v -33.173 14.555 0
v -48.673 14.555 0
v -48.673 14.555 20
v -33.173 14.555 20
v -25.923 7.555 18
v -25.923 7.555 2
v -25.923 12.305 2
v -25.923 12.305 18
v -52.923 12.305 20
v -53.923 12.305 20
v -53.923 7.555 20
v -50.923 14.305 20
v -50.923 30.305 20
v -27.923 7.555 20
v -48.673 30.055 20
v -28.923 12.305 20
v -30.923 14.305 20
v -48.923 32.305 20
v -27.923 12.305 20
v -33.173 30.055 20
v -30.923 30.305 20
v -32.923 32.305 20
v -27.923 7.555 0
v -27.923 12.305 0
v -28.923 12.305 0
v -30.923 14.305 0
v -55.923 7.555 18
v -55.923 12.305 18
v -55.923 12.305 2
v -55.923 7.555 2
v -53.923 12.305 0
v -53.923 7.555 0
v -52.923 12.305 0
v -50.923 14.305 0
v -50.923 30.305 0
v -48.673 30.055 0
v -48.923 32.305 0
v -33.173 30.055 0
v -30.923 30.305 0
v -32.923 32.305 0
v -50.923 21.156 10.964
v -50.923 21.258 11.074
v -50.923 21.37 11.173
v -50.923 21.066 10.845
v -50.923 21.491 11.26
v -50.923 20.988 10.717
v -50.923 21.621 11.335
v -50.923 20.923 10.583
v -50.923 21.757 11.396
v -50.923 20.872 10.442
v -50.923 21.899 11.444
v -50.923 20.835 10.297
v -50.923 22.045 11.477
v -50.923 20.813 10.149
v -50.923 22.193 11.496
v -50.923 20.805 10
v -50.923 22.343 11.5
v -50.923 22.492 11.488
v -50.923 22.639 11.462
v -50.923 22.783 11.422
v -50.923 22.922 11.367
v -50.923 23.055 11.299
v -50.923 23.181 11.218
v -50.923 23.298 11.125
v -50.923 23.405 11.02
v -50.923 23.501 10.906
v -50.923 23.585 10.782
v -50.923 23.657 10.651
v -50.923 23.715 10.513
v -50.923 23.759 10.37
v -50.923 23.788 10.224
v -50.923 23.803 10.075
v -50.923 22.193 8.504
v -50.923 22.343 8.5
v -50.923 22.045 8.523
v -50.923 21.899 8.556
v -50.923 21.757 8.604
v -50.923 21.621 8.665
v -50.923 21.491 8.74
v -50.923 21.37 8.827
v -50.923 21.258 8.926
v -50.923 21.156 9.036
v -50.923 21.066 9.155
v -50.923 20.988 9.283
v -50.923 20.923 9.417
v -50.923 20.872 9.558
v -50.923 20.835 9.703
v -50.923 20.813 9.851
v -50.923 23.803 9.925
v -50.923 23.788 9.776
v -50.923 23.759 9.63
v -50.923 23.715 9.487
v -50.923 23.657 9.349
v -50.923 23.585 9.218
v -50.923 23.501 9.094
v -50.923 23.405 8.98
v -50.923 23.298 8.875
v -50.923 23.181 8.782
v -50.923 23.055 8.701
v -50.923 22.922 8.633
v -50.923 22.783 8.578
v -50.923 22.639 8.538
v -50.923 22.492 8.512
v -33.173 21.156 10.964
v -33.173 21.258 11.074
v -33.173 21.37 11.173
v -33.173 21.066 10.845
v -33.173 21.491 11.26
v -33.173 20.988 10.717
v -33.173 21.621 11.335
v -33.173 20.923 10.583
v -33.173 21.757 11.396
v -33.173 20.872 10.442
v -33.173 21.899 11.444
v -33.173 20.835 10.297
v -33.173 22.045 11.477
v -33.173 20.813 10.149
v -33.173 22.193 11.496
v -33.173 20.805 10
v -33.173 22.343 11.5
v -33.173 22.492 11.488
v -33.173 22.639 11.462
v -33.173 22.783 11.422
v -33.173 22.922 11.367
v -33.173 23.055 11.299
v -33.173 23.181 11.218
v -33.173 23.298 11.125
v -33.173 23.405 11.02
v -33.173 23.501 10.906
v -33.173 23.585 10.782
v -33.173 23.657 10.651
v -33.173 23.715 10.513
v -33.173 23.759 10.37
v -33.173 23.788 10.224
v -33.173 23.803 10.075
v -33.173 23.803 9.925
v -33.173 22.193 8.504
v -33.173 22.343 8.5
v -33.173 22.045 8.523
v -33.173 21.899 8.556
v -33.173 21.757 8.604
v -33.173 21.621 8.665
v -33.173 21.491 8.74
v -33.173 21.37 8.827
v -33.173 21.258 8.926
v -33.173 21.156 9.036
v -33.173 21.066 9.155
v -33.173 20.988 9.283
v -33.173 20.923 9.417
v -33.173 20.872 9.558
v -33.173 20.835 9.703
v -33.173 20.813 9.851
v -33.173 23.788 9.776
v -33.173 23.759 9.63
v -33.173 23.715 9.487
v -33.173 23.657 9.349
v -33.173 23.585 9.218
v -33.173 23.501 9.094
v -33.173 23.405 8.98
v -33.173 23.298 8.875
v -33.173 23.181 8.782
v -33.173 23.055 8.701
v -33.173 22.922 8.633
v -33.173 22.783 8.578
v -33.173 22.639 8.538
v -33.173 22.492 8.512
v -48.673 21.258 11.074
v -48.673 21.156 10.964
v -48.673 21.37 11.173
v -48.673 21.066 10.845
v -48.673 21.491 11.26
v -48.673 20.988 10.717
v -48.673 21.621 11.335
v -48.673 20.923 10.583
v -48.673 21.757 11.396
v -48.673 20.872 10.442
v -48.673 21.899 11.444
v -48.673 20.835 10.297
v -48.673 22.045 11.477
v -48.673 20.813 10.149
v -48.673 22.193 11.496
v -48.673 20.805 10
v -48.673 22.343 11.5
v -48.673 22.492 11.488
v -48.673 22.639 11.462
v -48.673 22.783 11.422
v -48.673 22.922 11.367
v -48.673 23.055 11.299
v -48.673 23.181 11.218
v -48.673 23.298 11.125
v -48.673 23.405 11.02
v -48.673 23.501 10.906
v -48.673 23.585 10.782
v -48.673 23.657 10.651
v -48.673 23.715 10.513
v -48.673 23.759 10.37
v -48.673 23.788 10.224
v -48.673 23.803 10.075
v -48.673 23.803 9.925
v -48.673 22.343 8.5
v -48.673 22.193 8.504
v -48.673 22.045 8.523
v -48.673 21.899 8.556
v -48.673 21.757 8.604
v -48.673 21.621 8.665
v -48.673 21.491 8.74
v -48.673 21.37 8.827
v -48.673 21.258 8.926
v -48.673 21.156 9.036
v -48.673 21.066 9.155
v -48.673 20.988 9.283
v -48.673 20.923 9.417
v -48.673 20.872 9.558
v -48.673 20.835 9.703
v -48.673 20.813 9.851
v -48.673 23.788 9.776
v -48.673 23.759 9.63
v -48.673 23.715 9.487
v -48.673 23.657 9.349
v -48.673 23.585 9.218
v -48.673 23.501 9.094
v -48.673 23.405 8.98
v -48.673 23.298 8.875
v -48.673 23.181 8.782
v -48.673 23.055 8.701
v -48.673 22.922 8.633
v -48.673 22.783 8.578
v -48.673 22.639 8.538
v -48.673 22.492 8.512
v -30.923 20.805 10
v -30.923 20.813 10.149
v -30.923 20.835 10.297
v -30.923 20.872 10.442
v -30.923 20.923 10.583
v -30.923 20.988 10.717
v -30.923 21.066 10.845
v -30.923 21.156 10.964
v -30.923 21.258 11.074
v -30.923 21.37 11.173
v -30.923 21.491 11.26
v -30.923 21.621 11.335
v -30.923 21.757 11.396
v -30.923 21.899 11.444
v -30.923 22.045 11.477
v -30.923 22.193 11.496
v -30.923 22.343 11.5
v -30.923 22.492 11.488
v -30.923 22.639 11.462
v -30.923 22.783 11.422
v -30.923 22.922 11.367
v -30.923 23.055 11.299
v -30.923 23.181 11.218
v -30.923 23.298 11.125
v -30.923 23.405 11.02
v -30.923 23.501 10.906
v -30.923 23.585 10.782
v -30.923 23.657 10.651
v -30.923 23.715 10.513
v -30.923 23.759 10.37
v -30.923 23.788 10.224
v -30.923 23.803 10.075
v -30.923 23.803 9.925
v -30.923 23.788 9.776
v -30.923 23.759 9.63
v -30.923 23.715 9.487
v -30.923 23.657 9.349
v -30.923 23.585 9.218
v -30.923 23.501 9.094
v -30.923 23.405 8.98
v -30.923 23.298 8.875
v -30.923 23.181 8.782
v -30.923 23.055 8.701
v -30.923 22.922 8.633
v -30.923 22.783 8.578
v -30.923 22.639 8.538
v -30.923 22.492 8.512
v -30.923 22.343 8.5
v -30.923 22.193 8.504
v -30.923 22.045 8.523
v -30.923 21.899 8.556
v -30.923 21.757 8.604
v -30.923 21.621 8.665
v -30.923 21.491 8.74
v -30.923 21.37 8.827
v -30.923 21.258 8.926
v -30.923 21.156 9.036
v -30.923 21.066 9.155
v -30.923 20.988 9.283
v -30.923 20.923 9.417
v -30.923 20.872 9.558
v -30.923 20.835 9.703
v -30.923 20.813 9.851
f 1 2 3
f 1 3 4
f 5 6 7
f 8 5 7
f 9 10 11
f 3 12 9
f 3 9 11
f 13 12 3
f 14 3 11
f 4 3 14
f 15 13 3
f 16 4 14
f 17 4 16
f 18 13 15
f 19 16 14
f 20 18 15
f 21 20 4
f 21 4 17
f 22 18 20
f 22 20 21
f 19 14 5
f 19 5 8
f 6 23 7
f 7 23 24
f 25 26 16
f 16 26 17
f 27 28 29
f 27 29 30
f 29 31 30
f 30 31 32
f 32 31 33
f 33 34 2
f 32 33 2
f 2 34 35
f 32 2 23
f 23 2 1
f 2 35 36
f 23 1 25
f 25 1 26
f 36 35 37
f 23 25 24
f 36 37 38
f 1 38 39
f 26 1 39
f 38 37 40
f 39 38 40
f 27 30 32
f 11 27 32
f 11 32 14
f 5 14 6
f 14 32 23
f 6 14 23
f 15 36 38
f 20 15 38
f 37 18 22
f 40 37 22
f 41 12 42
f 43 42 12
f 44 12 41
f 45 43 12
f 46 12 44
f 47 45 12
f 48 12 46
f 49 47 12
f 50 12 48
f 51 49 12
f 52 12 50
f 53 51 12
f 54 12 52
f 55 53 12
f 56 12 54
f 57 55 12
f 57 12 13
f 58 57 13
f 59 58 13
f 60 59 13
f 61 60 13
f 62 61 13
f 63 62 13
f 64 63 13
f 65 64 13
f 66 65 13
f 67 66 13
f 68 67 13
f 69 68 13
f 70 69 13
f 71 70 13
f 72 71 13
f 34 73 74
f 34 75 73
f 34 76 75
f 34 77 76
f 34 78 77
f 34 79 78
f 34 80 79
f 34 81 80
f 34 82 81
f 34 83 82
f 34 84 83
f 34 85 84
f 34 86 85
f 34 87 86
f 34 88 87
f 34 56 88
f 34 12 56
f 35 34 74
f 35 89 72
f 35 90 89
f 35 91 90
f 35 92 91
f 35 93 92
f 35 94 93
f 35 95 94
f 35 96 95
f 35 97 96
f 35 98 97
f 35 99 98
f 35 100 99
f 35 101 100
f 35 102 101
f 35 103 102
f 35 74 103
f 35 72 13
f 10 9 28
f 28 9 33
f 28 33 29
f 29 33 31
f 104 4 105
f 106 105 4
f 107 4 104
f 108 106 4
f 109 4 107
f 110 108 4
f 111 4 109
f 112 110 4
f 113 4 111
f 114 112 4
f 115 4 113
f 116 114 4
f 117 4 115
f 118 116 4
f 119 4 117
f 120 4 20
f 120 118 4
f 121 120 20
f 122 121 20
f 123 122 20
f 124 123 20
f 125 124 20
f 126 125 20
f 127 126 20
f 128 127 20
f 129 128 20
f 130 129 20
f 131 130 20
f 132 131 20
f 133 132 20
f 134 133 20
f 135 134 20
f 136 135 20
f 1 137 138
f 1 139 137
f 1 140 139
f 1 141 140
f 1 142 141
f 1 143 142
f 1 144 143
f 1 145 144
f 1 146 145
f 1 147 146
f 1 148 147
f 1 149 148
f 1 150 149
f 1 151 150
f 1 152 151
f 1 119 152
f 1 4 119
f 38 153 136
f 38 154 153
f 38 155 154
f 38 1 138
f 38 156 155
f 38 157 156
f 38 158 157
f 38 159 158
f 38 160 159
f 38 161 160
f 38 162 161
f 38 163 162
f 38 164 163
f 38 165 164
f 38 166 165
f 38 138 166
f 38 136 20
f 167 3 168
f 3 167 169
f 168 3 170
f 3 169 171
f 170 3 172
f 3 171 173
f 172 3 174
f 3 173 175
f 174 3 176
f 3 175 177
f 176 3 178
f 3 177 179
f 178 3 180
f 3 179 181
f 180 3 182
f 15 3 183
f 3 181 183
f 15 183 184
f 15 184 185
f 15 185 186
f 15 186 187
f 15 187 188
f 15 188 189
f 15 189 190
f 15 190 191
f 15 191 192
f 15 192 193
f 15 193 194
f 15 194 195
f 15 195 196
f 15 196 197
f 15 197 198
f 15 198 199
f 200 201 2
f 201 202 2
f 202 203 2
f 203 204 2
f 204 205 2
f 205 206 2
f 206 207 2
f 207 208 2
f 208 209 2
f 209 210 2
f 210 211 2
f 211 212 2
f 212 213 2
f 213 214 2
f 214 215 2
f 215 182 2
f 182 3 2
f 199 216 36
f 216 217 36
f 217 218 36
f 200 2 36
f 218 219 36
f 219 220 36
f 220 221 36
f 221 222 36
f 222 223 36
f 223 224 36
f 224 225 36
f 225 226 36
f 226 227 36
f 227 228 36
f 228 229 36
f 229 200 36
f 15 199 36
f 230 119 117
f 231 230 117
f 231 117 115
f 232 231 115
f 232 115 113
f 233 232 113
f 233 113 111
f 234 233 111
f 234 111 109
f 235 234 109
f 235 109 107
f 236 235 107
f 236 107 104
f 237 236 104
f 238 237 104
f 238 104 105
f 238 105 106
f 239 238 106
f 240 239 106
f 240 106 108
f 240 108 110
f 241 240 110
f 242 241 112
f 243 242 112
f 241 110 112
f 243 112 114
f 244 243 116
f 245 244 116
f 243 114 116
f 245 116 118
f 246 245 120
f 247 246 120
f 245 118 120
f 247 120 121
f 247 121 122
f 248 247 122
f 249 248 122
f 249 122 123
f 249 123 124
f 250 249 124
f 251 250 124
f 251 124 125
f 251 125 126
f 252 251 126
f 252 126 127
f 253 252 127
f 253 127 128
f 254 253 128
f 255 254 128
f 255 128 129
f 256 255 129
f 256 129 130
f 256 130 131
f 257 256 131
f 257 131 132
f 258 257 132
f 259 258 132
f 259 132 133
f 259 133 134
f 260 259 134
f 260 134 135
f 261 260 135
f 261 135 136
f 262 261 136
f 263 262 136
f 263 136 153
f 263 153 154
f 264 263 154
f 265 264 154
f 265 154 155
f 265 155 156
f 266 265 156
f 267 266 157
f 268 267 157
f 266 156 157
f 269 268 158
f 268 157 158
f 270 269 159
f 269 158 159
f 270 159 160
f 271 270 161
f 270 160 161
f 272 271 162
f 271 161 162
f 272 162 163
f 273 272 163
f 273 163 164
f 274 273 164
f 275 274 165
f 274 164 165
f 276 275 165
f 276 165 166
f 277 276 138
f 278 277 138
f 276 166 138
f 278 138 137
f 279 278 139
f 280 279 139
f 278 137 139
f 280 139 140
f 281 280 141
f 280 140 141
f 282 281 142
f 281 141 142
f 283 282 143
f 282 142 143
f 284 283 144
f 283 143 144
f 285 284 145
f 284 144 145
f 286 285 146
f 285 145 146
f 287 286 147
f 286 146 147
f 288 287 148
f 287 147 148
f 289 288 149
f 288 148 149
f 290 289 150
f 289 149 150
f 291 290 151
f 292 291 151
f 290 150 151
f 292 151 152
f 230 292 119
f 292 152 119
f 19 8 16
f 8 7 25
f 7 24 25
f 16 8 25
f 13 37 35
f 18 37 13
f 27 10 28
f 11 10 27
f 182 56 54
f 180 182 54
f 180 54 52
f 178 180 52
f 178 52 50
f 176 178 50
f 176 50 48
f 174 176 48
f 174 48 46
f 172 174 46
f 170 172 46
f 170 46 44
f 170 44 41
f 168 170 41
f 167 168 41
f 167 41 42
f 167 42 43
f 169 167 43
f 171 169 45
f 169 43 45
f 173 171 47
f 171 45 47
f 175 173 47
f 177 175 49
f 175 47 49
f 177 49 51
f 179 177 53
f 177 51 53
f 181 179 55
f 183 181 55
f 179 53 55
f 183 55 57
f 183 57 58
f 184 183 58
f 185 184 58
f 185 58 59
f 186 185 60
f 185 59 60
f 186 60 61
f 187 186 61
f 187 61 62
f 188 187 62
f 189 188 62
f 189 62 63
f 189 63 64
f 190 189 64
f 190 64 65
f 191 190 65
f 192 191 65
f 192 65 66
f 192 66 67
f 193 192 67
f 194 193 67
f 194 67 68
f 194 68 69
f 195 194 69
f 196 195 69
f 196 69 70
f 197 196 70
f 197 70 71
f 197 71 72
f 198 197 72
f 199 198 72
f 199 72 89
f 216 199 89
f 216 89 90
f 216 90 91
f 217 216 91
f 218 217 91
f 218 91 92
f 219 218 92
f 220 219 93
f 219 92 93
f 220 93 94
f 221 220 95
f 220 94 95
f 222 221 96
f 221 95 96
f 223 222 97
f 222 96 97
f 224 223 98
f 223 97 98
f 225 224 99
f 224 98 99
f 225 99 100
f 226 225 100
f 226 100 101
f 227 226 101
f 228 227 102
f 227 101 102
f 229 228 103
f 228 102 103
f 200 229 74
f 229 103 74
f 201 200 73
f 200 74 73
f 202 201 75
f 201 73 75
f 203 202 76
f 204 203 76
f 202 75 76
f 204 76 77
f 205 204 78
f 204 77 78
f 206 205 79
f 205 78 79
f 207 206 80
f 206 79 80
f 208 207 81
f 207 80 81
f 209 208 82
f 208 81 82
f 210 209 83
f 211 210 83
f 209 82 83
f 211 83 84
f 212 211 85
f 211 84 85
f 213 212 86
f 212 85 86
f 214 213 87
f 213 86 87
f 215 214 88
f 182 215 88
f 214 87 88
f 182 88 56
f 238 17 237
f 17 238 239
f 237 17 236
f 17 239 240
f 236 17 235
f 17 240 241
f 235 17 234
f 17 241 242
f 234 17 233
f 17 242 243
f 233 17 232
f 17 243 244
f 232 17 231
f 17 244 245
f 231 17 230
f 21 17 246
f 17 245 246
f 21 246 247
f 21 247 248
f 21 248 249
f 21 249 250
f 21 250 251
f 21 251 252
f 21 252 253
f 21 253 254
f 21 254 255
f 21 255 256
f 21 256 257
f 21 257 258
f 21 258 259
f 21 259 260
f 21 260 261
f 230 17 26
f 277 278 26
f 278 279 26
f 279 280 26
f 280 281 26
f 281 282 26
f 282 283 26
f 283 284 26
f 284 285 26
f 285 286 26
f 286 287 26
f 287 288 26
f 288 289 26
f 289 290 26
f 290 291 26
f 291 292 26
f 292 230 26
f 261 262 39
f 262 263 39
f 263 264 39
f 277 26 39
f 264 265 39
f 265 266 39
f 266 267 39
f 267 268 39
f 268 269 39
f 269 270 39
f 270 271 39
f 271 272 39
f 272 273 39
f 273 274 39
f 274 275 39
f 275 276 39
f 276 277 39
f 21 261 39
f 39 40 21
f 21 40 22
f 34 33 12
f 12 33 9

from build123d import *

# Parameters (mm, degrees)
F0_W     = 20
F0_H     = 20
F0_W_2   = 15.5
F0_H_2   = 15.5
F1_DEPTH = 20
F2_SIZE  = 2
F3_R     = 1.5
F4_DEPTH = 25


with BuildPart() as f1:
    # F0 (on Top) → F1 (new body)
    with BuildSketch(Plane.XY):
        with Locations((-40.922806, 22.305217)):
            Rectangle(F0_W, F0_H)
        with Locations((-40.922806, 22.305217)):
            Rectangle(F0_W_2, F0_H_2, mode=Mode.SUBTRACT)
        Polygon((-30.922806, 12.305217), (-50.922806, 12.305217), (-55.922806, 12.305217), (-55.922806, 7.555217), (-25.922806, 7.555217), (-25.922806, 12.305217), align=None)
    extrude(amount=F1_DEPTH)

    # F2
    f2_edges = [f1.edges().sort_by_distance(p)[0] for p in [
        (-50.922806, 32.305217, 10),
        (-30.922806, 32.305217, 10),
        (-25.922806, 9.930217, 20),
        (-55.922806, 9.930217, 20),
        (-55.922806, 9.930217, 0),
        (-25.922806, 9.930217, 0),
        (-30.922806, 12.305217, 10),
        (-50.922806, 12.305217, 10),
    ]]
    chamfer(f2_edges, length=F2_SIZE)

    # F3 (on face) → F4 (cut)
    with BuildSketch(Plane(origin=(-50.922806, 0, 0), x_dir=(0, -1, 0), z_dir=(-1, 0, 0))):
        with Locations((-22.305217, 10)):
            Circle(F3_R)
    extrude(amount=-F4_DEPTH, mode=Mode.SUBTRACT)


solid = f1.part
